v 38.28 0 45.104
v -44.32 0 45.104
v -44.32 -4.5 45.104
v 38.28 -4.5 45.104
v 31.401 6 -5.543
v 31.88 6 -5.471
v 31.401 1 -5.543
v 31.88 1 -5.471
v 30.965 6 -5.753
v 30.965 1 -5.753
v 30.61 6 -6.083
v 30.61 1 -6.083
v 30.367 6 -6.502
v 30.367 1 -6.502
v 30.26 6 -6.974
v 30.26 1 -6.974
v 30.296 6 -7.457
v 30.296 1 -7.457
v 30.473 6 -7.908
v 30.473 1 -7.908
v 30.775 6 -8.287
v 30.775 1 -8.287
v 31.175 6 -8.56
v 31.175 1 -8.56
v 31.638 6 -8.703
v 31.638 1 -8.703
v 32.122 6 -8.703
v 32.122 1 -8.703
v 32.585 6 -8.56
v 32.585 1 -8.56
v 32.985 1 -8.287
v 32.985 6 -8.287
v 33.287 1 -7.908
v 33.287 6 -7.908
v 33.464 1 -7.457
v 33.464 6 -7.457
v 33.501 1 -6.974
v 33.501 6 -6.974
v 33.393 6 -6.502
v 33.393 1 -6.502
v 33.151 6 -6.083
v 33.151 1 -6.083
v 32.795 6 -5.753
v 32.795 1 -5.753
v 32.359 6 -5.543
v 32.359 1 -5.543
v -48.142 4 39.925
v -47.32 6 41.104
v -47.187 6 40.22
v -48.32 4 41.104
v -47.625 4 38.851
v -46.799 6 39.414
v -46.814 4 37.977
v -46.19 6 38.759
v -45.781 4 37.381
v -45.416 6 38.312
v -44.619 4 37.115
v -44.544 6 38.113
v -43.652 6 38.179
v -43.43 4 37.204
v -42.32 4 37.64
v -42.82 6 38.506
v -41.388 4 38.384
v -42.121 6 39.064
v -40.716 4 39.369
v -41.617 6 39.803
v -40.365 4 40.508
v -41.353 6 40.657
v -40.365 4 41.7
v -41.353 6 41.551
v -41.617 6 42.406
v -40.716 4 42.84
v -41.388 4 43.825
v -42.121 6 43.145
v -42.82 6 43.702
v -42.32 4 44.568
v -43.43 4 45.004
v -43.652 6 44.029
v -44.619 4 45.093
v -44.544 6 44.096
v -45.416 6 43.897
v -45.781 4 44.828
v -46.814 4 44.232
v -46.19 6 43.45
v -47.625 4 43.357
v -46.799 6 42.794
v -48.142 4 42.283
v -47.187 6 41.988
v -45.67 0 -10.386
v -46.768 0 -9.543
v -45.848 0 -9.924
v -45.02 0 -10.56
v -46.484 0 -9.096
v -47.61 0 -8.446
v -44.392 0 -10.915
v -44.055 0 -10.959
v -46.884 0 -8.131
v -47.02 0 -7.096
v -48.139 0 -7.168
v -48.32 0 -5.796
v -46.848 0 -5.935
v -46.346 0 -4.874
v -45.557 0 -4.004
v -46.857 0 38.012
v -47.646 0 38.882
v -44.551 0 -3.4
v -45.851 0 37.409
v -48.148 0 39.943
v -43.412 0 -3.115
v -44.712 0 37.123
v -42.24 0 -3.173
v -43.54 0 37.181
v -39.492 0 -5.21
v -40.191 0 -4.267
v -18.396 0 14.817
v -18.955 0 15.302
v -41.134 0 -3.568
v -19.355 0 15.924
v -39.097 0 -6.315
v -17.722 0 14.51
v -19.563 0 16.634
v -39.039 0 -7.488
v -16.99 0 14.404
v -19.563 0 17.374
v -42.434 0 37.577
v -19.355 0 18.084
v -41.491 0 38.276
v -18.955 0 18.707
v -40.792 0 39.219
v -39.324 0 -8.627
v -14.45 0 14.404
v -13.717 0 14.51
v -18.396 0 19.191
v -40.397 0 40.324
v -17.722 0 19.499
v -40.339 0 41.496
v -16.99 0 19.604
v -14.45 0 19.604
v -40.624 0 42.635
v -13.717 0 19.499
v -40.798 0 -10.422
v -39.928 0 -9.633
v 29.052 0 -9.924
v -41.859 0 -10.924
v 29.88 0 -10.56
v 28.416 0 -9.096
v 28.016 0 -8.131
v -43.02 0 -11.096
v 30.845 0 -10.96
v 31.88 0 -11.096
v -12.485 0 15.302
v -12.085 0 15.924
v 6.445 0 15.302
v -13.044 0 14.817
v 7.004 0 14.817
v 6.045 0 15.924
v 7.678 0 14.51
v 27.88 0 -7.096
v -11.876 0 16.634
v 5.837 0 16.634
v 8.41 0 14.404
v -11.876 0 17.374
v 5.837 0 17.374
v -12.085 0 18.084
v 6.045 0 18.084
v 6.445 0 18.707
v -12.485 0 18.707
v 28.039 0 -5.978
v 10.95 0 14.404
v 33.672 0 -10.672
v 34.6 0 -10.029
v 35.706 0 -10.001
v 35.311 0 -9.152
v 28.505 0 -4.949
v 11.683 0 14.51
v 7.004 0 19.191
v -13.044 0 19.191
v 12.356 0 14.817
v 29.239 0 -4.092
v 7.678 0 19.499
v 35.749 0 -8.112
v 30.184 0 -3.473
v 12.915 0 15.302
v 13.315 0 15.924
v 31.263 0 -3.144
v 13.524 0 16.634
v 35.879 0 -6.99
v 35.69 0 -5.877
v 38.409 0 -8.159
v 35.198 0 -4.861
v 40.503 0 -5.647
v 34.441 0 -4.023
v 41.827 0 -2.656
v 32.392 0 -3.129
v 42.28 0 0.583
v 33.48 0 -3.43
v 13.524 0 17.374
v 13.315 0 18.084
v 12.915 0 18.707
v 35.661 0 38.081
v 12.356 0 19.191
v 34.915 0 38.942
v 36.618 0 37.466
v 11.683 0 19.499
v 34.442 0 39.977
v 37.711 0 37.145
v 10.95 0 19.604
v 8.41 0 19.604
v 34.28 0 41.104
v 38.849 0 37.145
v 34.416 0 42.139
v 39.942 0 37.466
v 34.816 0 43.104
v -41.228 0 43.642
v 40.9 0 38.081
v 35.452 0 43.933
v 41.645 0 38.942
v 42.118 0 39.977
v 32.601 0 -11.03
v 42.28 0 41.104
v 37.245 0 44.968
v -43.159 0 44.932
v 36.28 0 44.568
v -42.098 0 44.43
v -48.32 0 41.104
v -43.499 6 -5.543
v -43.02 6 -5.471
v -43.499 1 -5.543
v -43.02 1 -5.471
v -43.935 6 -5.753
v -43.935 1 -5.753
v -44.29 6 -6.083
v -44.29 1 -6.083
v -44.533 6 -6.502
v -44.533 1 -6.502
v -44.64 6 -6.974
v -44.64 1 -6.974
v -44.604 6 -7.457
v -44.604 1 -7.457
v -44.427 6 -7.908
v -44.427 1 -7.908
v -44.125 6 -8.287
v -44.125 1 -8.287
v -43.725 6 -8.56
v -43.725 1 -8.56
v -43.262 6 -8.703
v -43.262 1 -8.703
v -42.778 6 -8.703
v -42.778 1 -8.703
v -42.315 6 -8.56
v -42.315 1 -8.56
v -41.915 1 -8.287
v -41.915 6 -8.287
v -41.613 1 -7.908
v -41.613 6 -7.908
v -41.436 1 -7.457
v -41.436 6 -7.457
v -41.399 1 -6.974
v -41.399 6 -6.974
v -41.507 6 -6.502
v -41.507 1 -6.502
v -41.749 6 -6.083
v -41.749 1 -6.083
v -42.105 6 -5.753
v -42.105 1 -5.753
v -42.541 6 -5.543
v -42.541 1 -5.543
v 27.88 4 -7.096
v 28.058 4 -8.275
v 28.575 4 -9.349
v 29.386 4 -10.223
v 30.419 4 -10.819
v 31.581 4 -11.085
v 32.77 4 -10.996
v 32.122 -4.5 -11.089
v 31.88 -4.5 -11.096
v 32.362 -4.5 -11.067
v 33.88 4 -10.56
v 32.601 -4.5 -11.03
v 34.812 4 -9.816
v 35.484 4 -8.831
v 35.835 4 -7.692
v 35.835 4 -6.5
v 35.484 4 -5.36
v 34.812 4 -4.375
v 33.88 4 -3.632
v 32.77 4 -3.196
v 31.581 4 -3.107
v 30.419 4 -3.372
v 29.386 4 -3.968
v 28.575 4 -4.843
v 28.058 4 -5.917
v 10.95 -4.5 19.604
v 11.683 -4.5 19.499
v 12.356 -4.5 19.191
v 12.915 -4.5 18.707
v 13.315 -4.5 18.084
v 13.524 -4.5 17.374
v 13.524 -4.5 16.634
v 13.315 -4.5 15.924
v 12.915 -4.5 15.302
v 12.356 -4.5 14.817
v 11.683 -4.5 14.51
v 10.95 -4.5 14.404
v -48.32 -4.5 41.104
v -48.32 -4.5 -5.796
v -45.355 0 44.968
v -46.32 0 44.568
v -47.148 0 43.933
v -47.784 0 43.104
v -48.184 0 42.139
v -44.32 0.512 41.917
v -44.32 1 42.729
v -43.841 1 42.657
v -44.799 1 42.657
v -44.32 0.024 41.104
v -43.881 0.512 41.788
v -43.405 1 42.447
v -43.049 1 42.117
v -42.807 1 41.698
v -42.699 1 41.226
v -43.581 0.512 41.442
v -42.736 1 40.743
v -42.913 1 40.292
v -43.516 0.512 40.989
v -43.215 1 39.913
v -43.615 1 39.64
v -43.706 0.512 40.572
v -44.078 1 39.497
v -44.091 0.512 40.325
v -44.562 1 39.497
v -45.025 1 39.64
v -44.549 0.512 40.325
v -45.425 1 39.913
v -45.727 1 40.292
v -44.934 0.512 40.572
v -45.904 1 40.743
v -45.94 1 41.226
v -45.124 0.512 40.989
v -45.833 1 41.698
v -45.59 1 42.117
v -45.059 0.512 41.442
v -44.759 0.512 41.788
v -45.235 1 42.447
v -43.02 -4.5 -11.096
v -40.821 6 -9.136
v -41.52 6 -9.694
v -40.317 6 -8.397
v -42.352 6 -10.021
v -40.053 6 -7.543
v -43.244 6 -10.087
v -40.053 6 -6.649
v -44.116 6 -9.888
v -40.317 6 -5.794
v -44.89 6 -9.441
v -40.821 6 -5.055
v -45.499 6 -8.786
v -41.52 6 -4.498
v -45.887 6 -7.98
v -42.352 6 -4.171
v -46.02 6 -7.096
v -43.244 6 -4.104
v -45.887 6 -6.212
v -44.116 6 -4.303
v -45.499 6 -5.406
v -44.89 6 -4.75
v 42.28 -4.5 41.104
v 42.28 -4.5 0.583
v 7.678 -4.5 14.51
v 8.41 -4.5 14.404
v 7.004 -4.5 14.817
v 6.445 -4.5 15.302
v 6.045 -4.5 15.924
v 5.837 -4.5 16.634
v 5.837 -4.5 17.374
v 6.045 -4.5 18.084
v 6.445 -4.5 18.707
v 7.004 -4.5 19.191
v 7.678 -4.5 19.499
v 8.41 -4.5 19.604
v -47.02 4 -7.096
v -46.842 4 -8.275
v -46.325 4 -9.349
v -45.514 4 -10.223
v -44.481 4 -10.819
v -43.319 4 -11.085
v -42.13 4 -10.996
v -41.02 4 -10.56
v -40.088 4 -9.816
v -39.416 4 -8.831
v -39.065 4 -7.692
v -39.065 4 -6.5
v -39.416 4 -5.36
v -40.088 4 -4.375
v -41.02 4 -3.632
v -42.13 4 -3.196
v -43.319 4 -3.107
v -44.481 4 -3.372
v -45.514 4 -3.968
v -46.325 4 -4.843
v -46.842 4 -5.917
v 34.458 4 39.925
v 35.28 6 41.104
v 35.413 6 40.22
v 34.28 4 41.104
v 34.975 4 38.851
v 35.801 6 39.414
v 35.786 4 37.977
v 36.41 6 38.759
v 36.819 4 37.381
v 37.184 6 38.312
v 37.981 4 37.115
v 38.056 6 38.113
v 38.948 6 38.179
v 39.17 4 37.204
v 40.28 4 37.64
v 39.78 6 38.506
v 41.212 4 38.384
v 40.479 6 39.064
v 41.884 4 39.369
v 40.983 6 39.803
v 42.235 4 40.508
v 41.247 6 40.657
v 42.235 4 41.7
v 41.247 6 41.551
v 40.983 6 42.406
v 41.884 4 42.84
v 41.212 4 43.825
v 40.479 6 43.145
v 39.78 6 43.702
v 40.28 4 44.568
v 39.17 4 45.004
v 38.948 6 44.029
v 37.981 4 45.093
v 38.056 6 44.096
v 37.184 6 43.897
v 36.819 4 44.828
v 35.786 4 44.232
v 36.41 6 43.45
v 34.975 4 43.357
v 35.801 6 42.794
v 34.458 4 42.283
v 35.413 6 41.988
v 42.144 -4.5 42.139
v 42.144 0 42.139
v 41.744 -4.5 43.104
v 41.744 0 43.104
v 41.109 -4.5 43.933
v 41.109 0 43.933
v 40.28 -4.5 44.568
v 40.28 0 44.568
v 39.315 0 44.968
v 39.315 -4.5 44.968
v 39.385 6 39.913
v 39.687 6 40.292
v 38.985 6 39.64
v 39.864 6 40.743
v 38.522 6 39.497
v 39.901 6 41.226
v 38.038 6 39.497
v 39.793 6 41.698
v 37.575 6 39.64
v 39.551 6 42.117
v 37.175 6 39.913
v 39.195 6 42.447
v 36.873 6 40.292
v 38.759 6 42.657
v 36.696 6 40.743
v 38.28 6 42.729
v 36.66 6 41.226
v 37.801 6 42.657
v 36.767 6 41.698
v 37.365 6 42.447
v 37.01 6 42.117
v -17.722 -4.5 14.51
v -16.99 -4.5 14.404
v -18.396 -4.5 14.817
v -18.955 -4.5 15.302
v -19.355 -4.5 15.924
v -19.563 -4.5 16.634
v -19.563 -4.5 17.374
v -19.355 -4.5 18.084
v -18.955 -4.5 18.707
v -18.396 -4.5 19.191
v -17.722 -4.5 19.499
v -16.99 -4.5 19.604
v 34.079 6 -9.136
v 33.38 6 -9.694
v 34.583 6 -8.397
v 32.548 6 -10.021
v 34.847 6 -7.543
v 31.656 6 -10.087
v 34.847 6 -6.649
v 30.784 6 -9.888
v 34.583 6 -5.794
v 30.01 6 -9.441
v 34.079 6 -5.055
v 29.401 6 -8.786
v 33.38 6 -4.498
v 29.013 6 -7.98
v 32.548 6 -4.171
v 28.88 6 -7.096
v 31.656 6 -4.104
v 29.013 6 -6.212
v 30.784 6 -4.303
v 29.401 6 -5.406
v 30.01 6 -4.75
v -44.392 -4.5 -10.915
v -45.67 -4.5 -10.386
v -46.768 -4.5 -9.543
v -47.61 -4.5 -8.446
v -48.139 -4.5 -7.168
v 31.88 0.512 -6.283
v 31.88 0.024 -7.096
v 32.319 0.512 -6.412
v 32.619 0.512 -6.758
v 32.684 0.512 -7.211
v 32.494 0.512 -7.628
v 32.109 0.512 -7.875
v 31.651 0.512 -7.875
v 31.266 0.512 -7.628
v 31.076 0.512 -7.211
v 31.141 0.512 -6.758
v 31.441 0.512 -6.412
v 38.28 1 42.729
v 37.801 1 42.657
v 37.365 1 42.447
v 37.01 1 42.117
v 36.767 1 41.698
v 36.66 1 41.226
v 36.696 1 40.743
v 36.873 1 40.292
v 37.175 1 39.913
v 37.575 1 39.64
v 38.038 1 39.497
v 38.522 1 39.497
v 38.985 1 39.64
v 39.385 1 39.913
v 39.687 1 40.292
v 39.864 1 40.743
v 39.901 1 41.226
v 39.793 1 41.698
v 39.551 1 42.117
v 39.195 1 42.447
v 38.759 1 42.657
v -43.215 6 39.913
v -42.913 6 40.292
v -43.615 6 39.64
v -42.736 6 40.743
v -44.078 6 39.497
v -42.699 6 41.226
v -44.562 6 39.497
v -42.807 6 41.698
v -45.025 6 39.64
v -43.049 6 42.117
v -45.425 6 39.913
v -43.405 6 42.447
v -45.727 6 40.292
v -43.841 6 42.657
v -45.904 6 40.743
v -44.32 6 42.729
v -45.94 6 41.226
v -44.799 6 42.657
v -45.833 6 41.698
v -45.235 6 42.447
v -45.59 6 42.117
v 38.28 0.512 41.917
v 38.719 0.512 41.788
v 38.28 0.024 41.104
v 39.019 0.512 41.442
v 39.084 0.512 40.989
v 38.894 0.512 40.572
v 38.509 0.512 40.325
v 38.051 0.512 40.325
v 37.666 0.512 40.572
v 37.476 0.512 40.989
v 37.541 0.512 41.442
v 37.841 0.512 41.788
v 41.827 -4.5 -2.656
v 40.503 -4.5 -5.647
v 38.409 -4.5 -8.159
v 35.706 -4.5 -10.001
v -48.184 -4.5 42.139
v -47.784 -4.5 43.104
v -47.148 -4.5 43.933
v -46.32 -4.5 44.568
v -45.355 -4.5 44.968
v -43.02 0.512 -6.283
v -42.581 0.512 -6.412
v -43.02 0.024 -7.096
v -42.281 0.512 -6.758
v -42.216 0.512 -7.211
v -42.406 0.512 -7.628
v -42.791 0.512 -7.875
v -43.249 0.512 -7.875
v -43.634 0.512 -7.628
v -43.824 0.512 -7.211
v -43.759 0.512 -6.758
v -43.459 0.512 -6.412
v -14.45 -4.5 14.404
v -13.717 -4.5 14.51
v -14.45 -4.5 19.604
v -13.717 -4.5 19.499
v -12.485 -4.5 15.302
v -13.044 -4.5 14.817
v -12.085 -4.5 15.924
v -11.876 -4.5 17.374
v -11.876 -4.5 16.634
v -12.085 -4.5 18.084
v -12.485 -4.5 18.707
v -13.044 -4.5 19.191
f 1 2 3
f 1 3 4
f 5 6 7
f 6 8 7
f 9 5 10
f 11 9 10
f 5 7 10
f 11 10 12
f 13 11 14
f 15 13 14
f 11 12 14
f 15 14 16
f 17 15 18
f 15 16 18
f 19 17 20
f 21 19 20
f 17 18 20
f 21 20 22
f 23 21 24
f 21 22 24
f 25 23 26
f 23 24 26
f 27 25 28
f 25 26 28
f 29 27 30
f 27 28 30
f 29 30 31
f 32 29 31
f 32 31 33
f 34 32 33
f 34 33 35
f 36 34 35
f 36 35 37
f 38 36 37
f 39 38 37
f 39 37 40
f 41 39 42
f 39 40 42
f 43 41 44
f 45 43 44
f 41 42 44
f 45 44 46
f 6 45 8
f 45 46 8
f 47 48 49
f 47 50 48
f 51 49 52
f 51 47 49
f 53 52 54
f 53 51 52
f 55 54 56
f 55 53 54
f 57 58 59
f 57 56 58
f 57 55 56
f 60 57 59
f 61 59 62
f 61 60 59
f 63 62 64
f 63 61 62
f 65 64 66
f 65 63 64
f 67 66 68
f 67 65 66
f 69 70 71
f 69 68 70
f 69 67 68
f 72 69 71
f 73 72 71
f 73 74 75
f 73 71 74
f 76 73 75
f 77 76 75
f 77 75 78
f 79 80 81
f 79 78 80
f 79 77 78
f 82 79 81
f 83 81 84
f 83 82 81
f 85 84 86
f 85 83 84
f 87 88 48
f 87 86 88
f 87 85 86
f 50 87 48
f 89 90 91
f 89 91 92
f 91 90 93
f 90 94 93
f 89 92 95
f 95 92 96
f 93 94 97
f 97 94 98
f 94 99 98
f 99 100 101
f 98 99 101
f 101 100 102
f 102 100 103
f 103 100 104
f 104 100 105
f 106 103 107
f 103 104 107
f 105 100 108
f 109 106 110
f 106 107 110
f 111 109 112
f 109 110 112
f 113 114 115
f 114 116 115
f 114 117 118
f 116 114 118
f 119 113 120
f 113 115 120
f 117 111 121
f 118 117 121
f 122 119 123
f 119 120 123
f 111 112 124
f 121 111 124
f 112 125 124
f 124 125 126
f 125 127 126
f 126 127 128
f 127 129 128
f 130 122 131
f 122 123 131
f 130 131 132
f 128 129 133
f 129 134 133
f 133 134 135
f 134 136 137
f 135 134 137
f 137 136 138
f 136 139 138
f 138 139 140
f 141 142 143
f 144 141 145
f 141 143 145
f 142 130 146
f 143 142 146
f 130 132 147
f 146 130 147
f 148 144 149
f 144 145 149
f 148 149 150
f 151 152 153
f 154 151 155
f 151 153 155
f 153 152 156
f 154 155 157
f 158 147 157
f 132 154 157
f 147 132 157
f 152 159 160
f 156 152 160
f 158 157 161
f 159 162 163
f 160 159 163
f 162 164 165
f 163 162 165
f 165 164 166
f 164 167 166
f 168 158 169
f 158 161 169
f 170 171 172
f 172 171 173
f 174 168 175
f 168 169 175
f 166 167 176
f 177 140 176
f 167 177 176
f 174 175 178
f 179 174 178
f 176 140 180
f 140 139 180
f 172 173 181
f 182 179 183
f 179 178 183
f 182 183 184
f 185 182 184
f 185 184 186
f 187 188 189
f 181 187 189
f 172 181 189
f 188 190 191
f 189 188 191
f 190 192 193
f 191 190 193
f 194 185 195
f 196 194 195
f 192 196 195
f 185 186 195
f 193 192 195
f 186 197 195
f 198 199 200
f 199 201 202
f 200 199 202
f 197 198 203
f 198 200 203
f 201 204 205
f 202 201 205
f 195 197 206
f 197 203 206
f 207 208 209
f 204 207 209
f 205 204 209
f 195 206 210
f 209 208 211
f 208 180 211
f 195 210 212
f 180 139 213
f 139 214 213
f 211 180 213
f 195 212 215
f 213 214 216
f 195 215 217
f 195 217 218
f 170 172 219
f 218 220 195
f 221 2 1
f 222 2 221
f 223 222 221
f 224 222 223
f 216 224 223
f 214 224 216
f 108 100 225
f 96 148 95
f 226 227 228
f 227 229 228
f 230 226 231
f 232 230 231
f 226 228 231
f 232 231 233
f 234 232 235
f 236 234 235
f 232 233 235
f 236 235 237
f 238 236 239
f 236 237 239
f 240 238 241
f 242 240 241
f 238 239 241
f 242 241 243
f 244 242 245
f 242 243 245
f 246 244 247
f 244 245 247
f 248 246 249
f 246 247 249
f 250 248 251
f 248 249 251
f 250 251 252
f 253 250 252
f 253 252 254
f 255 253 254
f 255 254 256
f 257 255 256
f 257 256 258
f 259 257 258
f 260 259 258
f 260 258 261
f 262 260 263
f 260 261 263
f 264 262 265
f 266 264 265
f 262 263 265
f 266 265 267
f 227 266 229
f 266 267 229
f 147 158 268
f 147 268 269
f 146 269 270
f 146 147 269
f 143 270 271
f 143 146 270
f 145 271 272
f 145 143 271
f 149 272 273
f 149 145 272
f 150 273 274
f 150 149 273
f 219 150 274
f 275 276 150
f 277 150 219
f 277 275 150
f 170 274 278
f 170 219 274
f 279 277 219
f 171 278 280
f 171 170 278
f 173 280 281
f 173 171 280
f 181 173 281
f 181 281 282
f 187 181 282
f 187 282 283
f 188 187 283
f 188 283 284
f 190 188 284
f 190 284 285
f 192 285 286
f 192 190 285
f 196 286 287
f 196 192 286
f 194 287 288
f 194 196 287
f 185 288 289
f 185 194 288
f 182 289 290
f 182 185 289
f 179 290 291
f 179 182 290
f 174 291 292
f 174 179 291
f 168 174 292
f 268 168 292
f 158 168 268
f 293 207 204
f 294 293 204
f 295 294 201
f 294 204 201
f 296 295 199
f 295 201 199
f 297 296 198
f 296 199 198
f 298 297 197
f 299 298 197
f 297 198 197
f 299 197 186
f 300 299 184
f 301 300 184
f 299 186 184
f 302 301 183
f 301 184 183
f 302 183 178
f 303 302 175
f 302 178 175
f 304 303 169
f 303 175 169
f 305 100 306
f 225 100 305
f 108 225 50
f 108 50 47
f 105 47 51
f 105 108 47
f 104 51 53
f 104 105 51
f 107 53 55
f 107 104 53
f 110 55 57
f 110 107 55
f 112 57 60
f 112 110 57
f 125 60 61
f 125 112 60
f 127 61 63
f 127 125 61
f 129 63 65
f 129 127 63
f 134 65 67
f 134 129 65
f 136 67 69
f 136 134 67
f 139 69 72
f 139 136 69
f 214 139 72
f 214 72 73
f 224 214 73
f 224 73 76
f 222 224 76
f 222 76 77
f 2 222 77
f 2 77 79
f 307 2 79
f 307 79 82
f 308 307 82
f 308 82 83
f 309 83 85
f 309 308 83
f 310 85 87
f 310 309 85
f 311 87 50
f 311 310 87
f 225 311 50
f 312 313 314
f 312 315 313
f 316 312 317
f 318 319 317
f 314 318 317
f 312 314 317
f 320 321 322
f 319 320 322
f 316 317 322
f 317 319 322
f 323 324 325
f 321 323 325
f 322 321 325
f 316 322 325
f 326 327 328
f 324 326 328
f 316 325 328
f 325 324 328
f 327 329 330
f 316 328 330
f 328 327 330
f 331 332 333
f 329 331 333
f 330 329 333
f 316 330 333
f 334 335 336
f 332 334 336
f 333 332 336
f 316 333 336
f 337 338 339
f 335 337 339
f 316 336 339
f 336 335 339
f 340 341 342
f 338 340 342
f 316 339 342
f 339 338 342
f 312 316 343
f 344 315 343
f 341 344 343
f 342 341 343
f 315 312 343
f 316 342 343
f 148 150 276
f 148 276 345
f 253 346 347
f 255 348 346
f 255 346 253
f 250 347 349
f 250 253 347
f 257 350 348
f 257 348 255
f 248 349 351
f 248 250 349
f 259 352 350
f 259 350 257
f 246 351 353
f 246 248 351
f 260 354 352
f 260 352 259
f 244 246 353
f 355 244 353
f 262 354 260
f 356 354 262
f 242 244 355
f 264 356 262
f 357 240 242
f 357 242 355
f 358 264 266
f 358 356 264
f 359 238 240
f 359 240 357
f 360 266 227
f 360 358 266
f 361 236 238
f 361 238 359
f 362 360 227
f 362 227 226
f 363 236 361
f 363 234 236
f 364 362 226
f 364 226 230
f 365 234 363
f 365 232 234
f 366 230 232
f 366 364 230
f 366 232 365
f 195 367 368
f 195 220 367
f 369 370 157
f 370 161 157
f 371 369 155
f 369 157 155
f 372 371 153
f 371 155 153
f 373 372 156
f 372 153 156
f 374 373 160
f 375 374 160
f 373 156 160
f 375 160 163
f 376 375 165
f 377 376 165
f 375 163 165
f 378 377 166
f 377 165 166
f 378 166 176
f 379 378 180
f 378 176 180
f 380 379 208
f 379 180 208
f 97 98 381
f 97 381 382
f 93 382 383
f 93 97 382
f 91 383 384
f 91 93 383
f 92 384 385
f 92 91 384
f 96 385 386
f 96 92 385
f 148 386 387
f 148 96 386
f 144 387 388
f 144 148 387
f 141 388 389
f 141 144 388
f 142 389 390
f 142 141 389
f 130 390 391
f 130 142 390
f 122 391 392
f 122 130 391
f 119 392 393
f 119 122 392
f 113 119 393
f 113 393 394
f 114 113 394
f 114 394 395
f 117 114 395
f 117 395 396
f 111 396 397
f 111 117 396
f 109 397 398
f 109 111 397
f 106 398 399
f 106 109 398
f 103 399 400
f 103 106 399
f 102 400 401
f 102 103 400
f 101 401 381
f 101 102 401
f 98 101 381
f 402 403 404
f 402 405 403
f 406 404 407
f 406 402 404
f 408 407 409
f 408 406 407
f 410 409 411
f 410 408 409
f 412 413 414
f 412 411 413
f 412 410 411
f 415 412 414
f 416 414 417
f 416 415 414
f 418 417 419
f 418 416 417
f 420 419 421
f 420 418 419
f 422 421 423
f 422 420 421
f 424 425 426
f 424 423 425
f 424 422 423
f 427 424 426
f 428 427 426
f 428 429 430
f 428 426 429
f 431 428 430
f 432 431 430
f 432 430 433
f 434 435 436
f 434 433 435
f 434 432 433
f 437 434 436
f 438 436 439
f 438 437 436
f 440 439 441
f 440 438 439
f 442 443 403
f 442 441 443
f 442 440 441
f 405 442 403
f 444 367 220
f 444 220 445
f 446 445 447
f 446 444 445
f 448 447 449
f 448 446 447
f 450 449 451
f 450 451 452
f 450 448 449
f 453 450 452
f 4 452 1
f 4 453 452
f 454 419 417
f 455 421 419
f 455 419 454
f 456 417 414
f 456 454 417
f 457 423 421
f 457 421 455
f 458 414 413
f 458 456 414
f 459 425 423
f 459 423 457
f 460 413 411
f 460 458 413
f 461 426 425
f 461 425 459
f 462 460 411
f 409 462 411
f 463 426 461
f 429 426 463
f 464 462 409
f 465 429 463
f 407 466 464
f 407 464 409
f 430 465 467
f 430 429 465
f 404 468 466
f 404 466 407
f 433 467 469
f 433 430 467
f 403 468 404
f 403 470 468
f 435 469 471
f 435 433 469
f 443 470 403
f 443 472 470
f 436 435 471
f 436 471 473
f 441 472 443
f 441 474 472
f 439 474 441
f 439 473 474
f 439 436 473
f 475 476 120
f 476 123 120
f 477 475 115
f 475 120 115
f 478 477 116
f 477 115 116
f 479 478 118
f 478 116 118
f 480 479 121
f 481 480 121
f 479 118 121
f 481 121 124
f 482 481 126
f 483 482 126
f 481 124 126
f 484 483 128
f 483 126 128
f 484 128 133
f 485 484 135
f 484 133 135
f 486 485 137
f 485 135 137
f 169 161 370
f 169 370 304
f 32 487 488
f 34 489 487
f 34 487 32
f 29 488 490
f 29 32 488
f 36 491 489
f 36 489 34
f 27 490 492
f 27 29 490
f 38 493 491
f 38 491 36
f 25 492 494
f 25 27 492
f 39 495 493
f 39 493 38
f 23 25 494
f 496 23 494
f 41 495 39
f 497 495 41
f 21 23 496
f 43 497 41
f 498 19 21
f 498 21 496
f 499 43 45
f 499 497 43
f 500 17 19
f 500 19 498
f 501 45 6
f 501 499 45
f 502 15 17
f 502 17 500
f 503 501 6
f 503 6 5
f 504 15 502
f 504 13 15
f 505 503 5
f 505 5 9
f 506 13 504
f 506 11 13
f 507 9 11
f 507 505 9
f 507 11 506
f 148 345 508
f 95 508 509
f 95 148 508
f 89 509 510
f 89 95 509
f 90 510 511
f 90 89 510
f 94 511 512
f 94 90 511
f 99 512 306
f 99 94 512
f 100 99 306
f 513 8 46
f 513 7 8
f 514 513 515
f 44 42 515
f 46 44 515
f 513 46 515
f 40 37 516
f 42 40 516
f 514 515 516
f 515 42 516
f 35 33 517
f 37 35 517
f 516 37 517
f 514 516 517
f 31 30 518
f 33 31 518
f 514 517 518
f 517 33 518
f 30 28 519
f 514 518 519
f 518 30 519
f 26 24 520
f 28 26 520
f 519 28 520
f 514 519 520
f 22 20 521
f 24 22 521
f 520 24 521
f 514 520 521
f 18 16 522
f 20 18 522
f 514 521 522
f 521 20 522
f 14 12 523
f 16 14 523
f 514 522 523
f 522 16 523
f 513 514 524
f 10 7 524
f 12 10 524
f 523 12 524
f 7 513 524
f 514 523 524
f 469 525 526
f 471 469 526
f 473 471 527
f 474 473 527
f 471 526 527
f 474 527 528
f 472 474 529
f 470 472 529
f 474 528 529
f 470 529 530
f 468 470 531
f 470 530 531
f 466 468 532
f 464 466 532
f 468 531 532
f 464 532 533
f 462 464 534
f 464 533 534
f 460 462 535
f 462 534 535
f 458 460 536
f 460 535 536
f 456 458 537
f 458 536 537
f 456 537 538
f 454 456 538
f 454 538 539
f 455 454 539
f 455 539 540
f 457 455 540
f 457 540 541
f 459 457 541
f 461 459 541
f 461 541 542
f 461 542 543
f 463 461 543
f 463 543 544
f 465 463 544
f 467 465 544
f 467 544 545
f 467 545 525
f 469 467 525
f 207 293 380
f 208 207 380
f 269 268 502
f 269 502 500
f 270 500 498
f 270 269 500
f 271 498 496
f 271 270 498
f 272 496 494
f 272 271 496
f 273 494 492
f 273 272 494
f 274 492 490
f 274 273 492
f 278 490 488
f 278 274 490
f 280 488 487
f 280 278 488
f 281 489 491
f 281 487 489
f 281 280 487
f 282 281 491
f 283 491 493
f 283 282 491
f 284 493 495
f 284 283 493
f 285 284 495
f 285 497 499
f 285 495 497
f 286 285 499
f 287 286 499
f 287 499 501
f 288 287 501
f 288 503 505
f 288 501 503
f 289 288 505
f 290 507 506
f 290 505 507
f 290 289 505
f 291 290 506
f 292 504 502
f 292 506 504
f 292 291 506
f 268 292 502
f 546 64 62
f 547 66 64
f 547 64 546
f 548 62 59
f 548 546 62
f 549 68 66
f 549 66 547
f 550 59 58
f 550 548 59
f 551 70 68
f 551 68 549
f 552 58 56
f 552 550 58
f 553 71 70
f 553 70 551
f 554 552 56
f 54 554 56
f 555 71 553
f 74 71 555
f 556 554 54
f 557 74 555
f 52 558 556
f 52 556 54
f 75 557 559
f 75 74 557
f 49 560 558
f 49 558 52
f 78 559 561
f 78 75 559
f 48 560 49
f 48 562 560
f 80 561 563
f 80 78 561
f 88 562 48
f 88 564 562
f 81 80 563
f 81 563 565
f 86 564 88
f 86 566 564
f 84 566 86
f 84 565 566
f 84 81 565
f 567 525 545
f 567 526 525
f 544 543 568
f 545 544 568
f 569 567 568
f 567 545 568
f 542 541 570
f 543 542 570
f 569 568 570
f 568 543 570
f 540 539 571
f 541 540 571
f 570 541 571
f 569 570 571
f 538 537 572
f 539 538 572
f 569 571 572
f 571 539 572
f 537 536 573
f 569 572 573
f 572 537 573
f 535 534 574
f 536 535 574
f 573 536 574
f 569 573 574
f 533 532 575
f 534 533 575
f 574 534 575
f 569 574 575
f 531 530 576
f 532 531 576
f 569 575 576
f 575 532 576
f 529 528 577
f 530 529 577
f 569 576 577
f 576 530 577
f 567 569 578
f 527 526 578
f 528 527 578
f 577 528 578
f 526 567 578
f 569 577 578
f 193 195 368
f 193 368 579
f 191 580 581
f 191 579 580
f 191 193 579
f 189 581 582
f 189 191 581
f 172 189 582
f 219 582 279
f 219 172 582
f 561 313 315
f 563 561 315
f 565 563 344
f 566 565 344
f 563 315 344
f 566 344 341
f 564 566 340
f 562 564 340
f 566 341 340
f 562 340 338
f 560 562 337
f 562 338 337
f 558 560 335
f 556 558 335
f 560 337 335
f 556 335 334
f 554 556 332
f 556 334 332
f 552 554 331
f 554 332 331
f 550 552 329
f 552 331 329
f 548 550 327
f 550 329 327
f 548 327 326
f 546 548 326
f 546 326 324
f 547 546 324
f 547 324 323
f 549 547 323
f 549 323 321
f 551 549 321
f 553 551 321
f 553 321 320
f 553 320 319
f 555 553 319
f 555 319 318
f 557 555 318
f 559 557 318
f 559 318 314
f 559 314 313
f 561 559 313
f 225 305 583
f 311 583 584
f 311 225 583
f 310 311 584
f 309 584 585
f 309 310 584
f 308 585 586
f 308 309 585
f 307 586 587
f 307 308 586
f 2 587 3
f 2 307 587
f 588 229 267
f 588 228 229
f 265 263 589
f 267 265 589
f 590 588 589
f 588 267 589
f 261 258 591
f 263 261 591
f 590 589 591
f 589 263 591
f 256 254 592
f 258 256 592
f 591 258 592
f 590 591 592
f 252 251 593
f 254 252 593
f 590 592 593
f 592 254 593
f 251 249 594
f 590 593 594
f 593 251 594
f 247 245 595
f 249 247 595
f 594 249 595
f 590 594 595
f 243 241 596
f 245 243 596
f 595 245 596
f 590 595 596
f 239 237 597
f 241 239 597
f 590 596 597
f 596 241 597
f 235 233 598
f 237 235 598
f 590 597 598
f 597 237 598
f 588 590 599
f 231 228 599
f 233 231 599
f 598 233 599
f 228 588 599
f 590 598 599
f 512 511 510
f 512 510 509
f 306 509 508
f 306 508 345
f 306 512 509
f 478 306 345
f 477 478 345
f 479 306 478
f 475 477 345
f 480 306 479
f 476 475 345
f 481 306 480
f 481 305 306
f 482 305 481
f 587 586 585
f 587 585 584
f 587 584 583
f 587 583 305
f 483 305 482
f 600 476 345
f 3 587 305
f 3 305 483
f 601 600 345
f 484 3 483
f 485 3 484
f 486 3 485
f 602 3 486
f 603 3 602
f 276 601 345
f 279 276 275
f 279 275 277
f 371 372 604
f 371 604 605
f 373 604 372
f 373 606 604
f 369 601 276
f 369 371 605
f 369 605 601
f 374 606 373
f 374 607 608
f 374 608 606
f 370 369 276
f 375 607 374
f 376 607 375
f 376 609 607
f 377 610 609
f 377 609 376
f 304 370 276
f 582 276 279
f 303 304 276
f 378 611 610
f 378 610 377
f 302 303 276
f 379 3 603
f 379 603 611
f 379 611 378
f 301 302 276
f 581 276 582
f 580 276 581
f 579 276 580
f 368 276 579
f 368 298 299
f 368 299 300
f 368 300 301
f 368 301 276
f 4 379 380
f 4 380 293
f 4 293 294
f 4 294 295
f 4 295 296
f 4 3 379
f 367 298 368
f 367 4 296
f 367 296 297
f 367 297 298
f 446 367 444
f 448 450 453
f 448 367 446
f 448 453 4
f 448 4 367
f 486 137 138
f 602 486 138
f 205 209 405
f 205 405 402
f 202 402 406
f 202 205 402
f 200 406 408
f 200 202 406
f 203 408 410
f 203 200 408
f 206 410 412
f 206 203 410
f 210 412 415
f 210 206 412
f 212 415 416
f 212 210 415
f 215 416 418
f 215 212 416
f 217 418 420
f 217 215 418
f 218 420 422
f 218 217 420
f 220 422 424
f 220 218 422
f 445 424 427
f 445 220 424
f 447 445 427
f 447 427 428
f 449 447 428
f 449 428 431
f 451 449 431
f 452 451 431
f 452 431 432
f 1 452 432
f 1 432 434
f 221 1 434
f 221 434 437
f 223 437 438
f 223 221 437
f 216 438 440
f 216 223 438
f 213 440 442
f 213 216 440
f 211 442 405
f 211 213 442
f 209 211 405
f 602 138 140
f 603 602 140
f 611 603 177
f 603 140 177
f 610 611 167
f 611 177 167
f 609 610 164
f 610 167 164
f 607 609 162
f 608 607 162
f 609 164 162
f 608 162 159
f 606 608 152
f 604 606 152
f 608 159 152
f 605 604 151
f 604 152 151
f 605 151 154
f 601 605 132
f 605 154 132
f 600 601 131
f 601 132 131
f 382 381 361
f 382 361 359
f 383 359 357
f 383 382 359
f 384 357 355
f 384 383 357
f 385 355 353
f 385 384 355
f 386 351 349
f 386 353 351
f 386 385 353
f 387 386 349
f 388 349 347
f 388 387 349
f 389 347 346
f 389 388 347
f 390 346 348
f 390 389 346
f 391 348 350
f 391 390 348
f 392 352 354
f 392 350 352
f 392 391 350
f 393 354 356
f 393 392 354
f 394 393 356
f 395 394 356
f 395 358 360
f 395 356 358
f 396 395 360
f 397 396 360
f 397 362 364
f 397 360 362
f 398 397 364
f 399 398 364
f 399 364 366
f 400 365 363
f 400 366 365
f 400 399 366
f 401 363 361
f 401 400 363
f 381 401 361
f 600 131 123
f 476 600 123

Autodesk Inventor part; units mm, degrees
ref_plane "YZ Plane" through (0, 0, 0) normal (1, 0, 0) x (0, 1, 0)
ref_plane "XZ Plane" through (0, 0, 0) normal (0, 1, 0) x (-1, 0, 0)
ref_plane "XY Plane" through (0, 0, 0) normal (0, 0, 1) x (1, 0, 0)
sketch "Arduino Hole Layout" plane through (0, 0, 0) normal (0, 1, 0) x (-1, 0, 0)
  circle A0 centre (43.0199, -7.0958) radius 1.55 construction
  circle A1 centre (-31.8801, -7.0958) radius 1.55 construction
  circle A2 centre (44.3199, 41.1042) radius 1.55 construction
  circle A3 centre (-38.2801, 41.1042) radius 1.55 construction
  line L0 (58.8879, -10.055) -> (-40.7911, -10.055) construction
  line L1 (-40.7911, -10.055) -> (-40.7911, 44.0634) construction
  line L2 (-40.7911, 44.0634) -> (58.8879, 44.0634) construction
  line L3 (58.8879, 44.0634) -> (58.8879, -10.055) construction
  line L4 (43.0199, -7.0958) -> (43.0199, -10.055) construction
  line L5 (44.3199, 41.1042) -> (44.3199, 44.0634) construction
  dimension "d0" = 3.1
  dimension "d1" = 74.9
  dimension "d2" = 1.3
  dimension "d3" = 48.2
  dimension "d5" = 82.6
  dimension "d9" = 15.868
  dimension "d10" = 54.1184
  dimension "d11" = 99.679
sketch "Sketch13" plane through (0, 0, 0) normal (0, 1, 0) x (-1, 0, 0)
  circle A0 centre (43.0199, -7.0958) radius 1.55 construction
  circle A1 centre (43.0199, -7.0958) radius 4
  point P0 (0, 0)
  point P1 (-38.2801, 41.1042)
  point P2 (-31.8801, -7.0958)
  point P3 (-38.2801, 41.1042)
  point P4 (44.3199, 41.1042)
  dimension "d48" = 8
extrude "Extrusion10" add sketch "Sketch13" along normal blind 6
sketch "Sketch14" plane through (-43.0199, 6, -7.0958) normal (0, 1, 0) x (1, 0, 0)
  circle A0 centre (0, 0) radius 4 construction
  point P0 (43.0199, -7.0958)
  point P1 (81.3, -48.2)
  point P2 (-1.3, -48.2)
  point P3 (74.9, 0)
  point P4 (81.3, -48.2)
  point P5 (-1.3, -48.2)
hole "Hole2" at (-43.0199, 6, -7.0958) direction (0, -1, 0) diameter 3.25 depth 5 tip angle 118
chamfer "Chamfer2" distance 1 distance2 2 1 edges at (-39.0199, 6, -7.0958) measured on face at (-46.1856, 6, -7.4802)
pattern_sketch "Sketch Driven Pattern1" from (-43.0199, 0, -7.0958) copies at (-44.3199, 0, 41.1042) at (31.8801, 0, -7.0958) at (38.2801, 0, 41.1042)
sketch "Sketch16" plane through (-44.3199, 0, 41.1042) normal (0, -1, 0) x (1, 0, 0)
  line L0 (-4, 4) -> (86.6, 4)
  line L1 (86.6, 4) -> (86.6, -52.2)
  line L2 (86.6, -52.2) -> (-4, -52.2)
  line L3 (-4, -52.2) -> (-4, 4)
  circle A0 centre (0, 0) radius 4 projected
  circle A1 centre (82.6, 0) radius 4 projected
  circle A2 centre (1.3, -48.2) radius 4 projected
  arc A3 (-4, -46.9) -> (1.3, -52.2) centre (1.3, -46.9) ccw
  arc A4 (73.0608, -52.2) -> (86.6, -40.521) centre (74.7932, -40.521) ccw
  circle A5 centre (76.2, -48.2) radius 4 projected
  point P0 (44.3199, -41.1042)
  point P1 (76.9208, -52.1345)
  point P2 (86.6, 0)
  point P3 (82.6, 4)
  point P4 (0, 4)
  point P5 (-4, 0)
  point P6 (76.2, -52.2)
extrude "Extrusion12" add sketch "Sketch16" along normal blind 4.5 contours A2 | L0 A1 L1 A4 A5 L2 A3 L3 A0 | A0 | A1 | A5
sketch "Sketch17" plane through (-44.3199, 0, 41.1042) normal (0, 1, 0) x (1, 0, 0)
  line L0 (-4, 52.2) -> (86.6, 52.2) construction
  line L1 (86.6, 52.2) -> (86.6, -4) construction
  line L2 (86.6, -4) -> (-4, -4) construction
  line L3 (-4, -4) -> (-4, 52.2) construction
  circle A0 centre (1.3, 48.2) radius 4 construction
  circle A1 centre (76.2, 48.2) radius 4 construction
  circle A2 centre (82.6, 0) radius 4 construction
  circle A3 centre (0, 0) radius 4 construction
  line L4 (41.3, 52.2) -> (41.3, -4) construction
  line L5 (82.6, -4) -> (0, -4) construction
  line L6 (-4, 24.1) -> (86.6, 24.1) construction
  line L7 (27.33, 24.1) -> (29.87, 24.1) construction
  line L8 (27.33, 21.5) -> (29.87, 21.5)
  line L9 (29.87, 26.7) -> (27.33, 26.7)
  arc A4 (27.33, 26.7) -> (27.33, 21.5) centre (27.33, 24.1) ccw
  arc A5 (29.87, 21.5) -> (29.87, 26.7) centre (29.87, 24.1) ccw
  line L10 (55.27, 21.5) -> (52.73, 21.5)
  line L11 (52.73, 26.7) -> (55.27, 26.7)
  arc A6 (55.27, 21.5) -> (55.27, 26.7) centre (55.27, 24.1) ccw
  arc A7 (52.73, 26.7) -> (52.73, 21.5) centre (52.73, 24.1) ccw
  point P0 (44.3199, 41.1042)
  point P1 (41.3, 24.1)
  point P2 (41.3, 24.1)
  point P3 (28.6, 24.1)
  point P4 (28.6, 26.7)
  point P5 (28.6, 21.5)
  dimension "d68" = 11.43
  dimension "d69" = 13.97
  dimension "d70" = 5.2
extrude "Extrusion13" cut sketch "Sketch17" against normal blind 10
properties part number "arduino_mega_standoffs_plate_t-slot-2inx1in"
